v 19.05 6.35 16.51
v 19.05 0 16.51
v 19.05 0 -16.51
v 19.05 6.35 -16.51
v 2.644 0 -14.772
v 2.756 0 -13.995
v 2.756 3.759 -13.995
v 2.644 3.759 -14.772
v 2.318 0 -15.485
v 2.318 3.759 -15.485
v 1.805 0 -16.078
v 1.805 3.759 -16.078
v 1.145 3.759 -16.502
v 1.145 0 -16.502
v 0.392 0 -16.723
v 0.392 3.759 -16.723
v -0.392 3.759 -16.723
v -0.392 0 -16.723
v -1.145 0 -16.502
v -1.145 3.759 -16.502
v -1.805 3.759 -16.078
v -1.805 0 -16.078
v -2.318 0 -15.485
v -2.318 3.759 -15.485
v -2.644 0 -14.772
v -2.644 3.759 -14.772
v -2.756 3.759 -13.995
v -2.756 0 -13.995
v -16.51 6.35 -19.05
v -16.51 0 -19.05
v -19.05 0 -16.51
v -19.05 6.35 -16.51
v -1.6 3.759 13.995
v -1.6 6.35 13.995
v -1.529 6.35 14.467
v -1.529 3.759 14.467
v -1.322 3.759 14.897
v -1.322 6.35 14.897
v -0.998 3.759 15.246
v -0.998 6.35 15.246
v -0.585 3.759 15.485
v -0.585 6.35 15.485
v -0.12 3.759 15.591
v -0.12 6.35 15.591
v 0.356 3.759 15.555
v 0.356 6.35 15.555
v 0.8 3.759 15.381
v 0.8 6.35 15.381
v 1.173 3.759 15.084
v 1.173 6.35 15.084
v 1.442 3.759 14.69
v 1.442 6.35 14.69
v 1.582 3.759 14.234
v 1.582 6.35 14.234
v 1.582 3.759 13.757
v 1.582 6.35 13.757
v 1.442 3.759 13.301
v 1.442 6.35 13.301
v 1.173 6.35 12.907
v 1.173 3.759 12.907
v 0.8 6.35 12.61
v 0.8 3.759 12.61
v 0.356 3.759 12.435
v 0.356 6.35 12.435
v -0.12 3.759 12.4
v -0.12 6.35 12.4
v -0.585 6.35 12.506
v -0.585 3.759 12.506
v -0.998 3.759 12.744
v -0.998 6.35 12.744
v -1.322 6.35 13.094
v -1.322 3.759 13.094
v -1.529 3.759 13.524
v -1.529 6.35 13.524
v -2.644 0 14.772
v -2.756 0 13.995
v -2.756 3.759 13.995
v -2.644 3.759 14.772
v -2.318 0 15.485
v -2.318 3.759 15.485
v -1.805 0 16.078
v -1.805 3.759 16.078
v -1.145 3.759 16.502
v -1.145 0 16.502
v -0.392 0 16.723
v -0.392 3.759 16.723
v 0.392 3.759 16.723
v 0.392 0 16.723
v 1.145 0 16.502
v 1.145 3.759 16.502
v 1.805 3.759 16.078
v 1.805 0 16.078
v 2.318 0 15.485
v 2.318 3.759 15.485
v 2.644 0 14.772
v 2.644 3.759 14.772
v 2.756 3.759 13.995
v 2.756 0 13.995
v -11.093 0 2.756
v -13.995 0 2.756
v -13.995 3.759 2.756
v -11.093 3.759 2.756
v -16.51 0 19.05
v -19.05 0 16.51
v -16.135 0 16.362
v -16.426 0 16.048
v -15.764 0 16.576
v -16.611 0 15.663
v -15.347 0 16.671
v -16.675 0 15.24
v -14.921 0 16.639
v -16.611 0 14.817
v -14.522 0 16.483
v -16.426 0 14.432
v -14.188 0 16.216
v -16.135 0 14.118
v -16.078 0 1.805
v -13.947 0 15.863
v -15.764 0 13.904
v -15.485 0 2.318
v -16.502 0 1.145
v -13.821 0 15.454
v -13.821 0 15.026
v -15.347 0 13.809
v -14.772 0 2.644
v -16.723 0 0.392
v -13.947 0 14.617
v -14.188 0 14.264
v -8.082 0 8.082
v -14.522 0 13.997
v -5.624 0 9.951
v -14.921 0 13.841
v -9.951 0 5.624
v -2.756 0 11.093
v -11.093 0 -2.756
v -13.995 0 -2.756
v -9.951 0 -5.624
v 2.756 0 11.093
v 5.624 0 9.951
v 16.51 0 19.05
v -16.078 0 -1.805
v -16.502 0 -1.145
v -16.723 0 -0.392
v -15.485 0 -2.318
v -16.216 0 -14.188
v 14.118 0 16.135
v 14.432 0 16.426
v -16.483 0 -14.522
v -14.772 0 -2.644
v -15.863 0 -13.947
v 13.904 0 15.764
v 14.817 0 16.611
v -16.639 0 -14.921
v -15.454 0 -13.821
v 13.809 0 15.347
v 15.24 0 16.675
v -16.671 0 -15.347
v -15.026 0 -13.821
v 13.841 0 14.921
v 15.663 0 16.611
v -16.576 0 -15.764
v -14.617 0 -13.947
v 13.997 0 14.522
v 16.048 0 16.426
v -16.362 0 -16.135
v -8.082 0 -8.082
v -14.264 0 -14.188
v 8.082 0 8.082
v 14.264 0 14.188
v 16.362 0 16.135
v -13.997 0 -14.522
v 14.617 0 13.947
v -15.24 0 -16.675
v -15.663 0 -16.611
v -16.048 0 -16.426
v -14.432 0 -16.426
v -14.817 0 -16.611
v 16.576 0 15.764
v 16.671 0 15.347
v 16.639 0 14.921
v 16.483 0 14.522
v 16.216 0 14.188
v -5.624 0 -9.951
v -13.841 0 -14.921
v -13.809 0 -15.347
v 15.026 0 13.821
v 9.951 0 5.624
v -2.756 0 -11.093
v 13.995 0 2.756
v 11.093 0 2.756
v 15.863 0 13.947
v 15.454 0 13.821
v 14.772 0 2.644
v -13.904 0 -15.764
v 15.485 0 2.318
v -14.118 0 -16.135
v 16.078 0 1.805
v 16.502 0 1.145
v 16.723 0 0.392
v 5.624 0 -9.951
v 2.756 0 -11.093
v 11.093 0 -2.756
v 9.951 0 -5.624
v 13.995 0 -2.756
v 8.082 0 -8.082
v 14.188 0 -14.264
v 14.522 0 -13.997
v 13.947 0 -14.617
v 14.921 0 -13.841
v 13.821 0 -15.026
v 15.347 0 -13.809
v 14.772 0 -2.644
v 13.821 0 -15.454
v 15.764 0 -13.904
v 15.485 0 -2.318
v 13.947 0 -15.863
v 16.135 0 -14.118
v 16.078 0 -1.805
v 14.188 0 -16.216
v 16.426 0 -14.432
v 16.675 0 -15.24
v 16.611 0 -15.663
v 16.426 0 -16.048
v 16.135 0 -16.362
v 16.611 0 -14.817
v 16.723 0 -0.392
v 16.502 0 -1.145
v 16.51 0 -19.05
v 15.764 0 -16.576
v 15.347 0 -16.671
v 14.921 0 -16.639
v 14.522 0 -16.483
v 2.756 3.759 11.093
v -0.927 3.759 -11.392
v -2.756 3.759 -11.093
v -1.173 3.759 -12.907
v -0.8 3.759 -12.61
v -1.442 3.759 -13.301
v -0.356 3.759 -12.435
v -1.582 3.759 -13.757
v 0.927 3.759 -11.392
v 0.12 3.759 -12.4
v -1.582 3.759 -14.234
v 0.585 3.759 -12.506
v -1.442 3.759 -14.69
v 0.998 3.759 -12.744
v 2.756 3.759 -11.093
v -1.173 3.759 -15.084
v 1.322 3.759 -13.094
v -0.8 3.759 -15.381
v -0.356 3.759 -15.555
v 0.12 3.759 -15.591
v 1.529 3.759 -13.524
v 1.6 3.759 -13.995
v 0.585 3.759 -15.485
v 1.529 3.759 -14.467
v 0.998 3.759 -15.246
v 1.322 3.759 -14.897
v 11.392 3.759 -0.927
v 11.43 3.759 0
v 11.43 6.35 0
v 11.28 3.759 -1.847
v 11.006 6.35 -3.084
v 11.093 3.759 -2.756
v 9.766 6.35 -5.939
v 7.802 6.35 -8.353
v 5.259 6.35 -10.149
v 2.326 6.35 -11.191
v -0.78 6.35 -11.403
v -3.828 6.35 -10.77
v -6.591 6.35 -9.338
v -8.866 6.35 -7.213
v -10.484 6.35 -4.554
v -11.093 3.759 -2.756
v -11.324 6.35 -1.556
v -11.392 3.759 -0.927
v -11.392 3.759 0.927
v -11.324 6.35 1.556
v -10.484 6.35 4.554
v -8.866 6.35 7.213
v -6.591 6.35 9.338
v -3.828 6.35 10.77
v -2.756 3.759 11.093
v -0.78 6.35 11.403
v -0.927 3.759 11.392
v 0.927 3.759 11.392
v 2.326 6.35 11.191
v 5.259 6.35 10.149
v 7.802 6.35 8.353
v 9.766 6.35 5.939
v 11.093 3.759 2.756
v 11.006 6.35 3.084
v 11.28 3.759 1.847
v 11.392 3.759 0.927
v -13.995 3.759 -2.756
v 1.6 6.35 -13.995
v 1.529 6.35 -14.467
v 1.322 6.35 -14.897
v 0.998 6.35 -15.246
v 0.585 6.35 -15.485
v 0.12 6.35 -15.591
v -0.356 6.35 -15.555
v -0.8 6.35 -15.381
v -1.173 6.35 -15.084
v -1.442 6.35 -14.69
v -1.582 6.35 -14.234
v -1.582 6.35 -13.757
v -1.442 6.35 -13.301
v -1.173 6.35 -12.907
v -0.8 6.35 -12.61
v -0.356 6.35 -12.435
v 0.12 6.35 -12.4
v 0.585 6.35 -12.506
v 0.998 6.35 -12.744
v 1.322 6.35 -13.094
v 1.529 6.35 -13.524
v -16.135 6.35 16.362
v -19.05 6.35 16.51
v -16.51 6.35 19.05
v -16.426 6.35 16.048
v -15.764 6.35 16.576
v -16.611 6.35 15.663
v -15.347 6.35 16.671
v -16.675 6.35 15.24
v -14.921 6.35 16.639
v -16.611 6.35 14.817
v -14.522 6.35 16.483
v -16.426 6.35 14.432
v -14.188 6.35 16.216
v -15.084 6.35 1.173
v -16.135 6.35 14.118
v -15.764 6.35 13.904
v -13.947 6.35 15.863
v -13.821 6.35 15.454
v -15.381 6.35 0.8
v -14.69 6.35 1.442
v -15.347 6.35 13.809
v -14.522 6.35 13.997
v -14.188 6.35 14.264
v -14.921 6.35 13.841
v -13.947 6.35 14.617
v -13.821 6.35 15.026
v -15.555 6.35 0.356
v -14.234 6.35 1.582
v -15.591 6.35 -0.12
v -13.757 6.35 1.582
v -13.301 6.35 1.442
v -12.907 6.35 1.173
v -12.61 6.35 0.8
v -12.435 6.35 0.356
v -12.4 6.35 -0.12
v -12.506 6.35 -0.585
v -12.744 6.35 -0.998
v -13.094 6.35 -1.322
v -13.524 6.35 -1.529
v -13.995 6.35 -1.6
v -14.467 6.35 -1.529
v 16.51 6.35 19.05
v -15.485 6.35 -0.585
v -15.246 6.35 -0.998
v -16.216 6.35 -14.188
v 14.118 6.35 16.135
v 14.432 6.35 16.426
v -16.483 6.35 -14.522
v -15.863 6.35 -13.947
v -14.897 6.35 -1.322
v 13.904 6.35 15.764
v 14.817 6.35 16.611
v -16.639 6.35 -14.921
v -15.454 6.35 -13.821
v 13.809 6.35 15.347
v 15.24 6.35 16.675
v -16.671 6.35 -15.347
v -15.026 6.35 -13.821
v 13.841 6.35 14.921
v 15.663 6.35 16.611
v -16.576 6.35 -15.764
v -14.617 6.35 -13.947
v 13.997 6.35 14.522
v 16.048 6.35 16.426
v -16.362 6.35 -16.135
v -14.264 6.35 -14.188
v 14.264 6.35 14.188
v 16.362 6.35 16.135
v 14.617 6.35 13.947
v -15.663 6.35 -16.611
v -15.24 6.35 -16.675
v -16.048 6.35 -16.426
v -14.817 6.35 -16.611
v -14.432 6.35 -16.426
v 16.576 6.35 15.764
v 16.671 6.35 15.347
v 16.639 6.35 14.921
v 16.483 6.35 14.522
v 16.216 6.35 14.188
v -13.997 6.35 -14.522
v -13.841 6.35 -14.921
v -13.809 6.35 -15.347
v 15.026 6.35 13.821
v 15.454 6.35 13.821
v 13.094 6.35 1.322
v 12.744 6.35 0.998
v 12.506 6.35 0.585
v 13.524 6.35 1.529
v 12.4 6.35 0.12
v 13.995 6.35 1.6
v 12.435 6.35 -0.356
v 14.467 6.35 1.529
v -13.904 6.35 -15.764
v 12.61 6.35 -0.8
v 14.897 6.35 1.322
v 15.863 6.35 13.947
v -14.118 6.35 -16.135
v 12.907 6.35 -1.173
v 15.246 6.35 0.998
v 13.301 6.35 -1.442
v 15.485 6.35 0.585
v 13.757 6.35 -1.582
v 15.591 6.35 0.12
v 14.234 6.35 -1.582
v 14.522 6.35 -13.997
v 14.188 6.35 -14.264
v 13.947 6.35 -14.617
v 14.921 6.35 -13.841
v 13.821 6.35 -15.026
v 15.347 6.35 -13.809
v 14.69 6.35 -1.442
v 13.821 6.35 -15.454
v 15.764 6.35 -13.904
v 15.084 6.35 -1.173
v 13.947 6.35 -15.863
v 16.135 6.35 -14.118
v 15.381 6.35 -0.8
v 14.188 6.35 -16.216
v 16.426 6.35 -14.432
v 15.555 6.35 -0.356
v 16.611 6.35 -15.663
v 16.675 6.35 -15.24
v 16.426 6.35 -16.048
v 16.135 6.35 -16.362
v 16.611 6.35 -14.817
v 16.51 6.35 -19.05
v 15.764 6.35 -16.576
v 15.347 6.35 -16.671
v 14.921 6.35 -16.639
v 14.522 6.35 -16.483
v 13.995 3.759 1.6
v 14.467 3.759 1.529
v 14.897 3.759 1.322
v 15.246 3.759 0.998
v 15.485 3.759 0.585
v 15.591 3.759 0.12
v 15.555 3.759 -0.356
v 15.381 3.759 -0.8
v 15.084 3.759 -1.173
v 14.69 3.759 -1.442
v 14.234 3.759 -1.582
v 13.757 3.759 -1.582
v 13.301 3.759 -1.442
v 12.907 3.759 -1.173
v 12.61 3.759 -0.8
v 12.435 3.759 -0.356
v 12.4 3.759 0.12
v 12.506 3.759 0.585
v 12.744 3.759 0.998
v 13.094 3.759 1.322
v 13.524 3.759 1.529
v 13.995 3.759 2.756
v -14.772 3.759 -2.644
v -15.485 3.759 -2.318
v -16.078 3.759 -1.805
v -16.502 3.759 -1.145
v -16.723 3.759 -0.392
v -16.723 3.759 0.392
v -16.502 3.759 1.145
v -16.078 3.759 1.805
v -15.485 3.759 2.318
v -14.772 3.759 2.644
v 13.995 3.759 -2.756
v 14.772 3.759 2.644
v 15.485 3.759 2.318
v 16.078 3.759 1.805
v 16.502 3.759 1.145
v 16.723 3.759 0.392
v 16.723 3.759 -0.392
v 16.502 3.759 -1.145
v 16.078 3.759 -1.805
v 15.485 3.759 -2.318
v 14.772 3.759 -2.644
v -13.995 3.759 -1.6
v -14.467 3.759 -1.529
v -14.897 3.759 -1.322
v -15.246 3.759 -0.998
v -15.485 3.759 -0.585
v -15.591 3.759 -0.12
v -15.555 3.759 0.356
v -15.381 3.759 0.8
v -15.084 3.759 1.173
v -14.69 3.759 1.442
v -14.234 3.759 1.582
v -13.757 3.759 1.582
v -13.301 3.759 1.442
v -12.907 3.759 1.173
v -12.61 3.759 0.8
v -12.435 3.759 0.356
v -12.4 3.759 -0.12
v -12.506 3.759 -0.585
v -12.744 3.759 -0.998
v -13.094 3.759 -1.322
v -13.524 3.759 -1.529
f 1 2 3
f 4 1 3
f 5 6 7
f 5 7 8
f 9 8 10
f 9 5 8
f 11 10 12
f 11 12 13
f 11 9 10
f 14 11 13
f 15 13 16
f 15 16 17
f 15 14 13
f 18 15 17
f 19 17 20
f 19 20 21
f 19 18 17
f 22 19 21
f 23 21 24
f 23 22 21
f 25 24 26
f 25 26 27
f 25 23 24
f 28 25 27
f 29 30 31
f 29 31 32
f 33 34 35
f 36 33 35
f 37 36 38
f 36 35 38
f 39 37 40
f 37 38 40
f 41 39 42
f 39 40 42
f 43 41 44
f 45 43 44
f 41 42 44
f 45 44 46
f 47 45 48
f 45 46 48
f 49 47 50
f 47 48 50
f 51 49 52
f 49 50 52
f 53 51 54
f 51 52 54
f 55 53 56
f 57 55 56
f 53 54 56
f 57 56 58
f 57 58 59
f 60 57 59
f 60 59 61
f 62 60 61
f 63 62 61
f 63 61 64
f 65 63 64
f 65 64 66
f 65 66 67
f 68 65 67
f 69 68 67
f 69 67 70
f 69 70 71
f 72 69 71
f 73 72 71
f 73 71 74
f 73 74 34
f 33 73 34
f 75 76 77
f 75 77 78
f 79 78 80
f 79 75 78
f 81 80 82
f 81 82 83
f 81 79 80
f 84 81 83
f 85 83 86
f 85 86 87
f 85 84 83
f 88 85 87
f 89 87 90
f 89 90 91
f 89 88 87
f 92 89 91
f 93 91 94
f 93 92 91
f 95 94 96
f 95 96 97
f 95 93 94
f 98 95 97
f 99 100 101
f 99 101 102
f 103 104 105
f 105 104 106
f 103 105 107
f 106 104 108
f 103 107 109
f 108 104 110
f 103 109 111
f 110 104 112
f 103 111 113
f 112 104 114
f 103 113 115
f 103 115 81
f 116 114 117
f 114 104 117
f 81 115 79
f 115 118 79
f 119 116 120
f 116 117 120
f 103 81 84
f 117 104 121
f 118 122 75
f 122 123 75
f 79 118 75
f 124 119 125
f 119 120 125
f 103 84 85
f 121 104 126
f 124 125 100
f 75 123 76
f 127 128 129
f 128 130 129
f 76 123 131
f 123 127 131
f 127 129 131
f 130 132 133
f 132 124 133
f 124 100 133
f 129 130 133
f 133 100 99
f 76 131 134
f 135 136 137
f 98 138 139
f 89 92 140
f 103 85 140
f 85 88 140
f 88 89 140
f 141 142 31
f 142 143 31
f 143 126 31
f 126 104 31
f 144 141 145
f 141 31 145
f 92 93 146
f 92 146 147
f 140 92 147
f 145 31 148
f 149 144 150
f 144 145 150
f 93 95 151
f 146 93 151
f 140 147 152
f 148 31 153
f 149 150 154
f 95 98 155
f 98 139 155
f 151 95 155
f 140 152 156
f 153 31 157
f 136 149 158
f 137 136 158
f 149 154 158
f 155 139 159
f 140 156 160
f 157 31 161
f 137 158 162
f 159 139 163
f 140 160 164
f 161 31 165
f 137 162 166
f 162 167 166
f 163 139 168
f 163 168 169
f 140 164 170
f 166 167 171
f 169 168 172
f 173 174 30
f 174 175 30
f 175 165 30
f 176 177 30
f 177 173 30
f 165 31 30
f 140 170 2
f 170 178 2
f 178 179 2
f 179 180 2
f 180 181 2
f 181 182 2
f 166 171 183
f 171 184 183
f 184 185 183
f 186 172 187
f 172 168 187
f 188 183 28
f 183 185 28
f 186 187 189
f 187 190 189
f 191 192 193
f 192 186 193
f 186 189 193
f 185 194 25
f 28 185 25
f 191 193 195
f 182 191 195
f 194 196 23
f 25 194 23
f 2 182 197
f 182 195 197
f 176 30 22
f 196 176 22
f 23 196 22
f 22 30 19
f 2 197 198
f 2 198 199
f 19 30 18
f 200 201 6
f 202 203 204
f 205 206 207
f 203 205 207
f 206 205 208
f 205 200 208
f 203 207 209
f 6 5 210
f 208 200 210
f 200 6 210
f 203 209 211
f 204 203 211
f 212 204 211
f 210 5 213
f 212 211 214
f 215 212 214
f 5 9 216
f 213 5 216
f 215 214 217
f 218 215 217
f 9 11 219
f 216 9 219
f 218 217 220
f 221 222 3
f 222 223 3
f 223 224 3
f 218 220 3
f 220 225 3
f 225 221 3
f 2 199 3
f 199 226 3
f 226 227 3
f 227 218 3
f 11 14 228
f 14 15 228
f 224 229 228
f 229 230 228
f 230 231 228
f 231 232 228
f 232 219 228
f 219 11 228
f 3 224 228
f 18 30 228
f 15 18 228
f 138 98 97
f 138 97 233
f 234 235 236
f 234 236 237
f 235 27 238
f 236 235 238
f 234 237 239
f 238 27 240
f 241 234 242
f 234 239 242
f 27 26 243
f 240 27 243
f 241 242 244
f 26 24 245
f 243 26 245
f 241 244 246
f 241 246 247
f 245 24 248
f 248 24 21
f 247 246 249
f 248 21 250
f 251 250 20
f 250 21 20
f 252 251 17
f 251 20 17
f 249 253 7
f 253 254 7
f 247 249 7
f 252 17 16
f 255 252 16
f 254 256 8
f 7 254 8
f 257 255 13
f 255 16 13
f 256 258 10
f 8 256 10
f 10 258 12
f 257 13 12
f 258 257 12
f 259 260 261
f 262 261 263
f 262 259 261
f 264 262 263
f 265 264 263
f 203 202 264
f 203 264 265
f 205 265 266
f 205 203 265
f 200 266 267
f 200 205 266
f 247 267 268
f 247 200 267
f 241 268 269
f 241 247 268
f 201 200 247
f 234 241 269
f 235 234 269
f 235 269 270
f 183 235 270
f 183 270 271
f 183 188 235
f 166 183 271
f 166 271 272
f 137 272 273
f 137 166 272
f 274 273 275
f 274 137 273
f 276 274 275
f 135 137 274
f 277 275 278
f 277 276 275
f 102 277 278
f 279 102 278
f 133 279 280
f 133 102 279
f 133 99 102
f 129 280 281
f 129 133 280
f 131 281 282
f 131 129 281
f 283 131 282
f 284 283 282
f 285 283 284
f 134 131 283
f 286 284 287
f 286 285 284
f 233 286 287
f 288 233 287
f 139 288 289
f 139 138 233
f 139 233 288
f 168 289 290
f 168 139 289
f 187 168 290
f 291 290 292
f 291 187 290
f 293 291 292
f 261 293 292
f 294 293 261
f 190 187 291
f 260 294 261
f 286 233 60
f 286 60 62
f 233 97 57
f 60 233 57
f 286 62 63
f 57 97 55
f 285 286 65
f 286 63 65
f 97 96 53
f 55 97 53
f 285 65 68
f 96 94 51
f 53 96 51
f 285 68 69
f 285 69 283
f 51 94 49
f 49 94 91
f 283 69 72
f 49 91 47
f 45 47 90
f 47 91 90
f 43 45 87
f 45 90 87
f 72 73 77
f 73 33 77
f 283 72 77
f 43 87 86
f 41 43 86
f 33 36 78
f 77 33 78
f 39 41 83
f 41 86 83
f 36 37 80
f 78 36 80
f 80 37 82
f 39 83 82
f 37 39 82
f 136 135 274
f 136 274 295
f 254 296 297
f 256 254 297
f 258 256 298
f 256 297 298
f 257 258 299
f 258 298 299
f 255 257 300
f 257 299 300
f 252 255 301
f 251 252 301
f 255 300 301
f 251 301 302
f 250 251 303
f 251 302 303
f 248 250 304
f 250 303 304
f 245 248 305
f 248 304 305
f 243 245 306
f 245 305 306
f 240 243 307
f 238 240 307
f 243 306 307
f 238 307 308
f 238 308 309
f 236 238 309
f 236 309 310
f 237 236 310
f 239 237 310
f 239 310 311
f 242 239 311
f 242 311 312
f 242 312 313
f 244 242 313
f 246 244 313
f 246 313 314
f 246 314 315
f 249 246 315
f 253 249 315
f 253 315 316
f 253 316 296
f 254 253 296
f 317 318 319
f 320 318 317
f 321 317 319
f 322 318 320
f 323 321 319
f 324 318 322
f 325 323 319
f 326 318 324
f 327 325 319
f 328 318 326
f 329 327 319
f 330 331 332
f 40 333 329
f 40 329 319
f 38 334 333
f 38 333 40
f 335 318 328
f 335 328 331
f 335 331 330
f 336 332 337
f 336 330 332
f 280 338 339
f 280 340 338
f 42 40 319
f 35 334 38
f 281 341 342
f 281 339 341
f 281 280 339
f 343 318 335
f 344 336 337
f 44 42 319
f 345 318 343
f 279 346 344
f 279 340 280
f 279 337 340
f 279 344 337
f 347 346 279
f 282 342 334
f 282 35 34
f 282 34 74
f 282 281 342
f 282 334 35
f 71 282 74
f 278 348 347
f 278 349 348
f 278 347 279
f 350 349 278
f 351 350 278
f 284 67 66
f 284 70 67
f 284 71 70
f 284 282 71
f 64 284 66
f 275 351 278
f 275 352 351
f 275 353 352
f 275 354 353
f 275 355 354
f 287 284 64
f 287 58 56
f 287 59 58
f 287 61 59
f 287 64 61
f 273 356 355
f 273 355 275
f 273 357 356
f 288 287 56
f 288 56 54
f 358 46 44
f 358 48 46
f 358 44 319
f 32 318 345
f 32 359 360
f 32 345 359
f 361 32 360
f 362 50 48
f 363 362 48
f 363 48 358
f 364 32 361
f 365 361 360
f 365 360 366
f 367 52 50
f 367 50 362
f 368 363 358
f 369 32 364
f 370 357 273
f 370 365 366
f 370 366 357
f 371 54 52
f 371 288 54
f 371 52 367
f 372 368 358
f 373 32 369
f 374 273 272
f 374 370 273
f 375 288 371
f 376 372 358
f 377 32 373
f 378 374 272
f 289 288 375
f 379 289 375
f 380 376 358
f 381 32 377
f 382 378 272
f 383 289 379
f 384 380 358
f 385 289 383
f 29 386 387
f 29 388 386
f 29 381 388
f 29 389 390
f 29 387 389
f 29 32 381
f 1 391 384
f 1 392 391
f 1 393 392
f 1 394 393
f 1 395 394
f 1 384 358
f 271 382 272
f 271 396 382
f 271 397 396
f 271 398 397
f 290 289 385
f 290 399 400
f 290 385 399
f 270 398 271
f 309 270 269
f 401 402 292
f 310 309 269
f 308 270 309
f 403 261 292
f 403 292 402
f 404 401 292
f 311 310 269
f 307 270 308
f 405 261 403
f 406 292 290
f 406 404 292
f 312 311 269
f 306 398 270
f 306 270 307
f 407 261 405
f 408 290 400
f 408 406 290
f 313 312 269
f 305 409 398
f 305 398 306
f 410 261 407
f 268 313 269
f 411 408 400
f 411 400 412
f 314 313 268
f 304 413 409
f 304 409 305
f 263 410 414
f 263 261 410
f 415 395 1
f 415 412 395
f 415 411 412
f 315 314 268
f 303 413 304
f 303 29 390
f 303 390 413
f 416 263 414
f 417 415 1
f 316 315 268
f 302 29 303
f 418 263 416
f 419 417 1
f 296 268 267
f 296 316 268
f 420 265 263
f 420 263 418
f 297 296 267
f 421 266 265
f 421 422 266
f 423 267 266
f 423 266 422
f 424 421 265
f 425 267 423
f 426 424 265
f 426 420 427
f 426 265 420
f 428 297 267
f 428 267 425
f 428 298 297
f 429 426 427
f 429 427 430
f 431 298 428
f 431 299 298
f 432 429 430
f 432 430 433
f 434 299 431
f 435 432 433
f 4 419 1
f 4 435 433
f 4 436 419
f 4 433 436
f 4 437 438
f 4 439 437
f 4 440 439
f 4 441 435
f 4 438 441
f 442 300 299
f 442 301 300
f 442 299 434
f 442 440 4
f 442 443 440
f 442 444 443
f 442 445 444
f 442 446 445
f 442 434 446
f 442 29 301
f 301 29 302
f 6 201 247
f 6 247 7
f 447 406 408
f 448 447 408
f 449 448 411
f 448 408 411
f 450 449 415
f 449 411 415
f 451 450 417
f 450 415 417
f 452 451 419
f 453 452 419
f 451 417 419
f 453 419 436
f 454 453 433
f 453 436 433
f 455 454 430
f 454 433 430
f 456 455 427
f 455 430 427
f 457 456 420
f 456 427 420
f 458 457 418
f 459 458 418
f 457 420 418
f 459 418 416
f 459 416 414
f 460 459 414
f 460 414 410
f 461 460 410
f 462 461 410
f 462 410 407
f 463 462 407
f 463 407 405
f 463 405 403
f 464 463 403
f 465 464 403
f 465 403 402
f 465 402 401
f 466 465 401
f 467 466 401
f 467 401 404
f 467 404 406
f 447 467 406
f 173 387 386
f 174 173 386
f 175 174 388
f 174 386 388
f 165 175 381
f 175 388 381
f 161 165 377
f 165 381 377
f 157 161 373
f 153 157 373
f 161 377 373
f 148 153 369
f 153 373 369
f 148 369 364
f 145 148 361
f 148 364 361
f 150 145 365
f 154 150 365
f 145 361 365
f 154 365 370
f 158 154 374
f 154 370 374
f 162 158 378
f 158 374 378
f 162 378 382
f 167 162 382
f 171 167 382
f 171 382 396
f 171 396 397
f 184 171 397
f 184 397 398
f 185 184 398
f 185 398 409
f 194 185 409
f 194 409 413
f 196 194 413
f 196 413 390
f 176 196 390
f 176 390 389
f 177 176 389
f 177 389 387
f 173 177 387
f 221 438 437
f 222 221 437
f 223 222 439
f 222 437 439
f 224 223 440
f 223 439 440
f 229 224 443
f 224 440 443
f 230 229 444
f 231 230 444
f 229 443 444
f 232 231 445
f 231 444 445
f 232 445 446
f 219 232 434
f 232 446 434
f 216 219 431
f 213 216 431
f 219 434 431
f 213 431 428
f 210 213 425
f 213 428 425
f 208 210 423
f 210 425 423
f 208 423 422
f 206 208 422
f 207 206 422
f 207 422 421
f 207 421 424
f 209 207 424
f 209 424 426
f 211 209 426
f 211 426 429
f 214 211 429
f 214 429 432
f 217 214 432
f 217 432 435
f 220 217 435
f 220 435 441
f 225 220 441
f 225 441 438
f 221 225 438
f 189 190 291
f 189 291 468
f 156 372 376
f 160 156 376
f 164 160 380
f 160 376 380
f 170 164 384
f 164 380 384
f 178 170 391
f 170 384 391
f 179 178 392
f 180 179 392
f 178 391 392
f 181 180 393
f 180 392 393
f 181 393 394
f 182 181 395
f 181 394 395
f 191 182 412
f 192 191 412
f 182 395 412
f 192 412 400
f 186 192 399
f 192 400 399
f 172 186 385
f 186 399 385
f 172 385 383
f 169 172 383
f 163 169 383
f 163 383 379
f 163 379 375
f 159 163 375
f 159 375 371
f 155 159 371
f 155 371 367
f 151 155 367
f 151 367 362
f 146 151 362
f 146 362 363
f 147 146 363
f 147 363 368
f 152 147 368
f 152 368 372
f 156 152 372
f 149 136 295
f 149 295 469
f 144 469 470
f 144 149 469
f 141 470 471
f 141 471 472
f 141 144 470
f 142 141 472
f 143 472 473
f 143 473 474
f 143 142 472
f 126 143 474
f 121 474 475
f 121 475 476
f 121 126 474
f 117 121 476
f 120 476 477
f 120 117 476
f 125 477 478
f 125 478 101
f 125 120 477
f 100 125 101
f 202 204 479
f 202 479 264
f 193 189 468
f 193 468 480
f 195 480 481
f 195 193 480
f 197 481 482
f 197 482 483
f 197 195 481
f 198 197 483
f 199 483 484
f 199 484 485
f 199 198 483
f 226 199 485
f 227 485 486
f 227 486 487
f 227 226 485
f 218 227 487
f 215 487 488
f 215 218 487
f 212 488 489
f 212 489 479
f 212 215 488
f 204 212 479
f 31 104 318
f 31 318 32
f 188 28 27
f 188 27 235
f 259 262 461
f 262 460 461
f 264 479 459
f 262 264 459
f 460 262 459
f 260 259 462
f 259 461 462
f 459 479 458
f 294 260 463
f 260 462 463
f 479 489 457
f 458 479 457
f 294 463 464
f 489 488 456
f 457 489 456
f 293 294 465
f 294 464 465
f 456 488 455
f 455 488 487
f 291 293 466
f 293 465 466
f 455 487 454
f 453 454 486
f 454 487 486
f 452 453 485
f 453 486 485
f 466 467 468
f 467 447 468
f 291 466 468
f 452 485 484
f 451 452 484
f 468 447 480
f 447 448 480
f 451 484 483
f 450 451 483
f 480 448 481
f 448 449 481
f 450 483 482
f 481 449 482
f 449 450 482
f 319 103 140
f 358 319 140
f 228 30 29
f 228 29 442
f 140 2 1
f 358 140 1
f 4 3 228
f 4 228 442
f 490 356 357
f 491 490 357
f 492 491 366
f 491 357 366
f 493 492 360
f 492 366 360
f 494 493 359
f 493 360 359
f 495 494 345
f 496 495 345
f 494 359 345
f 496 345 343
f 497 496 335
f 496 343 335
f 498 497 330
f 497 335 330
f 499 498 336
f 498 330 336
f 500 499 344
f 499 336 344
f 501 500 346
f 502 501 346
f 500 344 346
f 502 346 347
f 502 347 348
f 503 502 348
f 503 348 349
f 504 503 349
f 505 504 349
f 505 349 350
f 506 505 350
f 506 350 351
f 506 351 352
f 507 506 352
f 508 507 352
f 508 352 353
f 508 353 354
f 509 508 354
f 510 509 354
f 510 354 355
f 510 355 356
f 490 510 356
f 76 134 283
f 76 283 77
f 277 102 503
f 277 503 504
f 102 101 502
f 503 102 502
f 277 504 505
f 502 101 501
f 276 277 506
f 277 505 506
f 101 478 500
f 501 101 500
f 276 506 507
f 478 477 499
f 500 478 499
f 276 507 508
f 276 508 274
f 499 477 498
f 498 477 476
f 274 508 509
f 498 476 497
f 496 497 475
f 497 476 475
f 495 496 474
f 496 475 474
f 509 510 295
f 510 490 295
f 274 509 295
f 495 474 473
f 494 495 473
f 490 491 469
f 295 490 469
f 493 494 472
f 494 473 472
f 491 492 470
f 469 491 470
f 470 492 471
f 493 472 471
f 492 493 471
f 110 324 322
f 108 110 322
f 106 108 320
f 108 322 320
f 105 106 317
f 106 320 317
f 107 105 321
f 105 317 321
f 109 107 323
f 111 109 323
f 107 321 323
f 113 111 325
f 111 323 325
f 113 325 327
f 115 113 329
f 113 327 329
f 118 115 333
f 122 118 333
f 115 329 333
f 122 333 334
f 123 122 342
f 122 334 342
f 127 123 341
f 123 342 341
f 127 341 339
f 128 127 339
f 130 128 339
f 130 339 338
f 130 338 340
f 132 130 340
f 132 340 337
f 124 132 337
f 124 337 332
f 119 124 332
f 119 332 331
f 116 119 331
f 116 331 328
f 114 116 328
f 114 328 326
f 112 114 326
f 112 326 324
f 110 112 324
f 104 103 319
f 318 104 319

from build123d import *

# Parameters (mm, degrees)
SKETCH1_W           = 38.1
SKETCH1_H           = 38.1
SKETCH1_R           = 11.43
BOSS_EXTRUDE1_DEPTH = 6.35
SKETCH2_R           = 1.6002
SKETCH2_R_2         = 1.4351
CUT_EXTRUDE1_DEPTH  = 7.35
CIRPATTERN1_COUNT   = 4
CHAMFER1_SIZE       = 2.54
CUT_EXTRUDE2_DEPTH  = 3.7592
CIRPATTERN4_COUNT   = 4


with BuildPart() as part:
    # Sketch1 → Boss-Extrude1 (new body)
    with BuildSketch(Plane(origin=(0, 0, 0), x_dir=(1, 0, 0), z_dir=(0, 1, 0))):
        Rectangle(SKETCH1_W, SKETCH1_H)
        Circle(SKETCH1_R, mode=Mode.SUBTRACT)
    extrude(amount=BOSS_EXTRUDE1_DEPTH)

    # Sketch2 → Cut-Extrude1 (cut, through all)
    with BuildSketch(Plane(origin=(0, 6.35, 0), x_dir=(1, 0, 0), z_dir=(0, 1, 0))):
        with Locations((0, 13.9954)):
            Circle(SKETCH2_R)
        with Locations((15.24, 15.24)):
            Circle(SKETCH2_R_2)
    cut_extrude1 = extrude(amount=-CUT_EXTRUDE1_DEPTH, mode=Mode.SUBTRACT)

    # CirPattern1: Cut-Extrude1 ×4 about axis
    cirpattern1_axis = Axis((0, 0, 0), (0, 1, 0))
    for i in range(1, CIRPATTERN1_COUNT):
        add(cut_extrude1.rotate(cirpattern1_axis, i * 360 / CIRPATTERN1_COUNT), mode=Mode.SUBTRACT)

    # Chamfer1
    chamfer1_edges = [part.edges().sort_by_distance(p)[0] for p in [
        (19.05, 3.175, 19.05),
        (-19.05, 3.175, 19.05),
        (-19.05, 3.175, -19.05),
        (19.05, 3.175, -19.05),
    ]]
    chamfer(chamfer1_edges, length=CHAMFER1_SIZE)

    # Sketch3 → Cut-Extrude2 (cut)
    with BuildSketch(Plane.XZ):
        with BuildLine():
            Line((2.7559, 13.9954), (2.7559, 0))
            ThreePointArc((2.7559, 0), (0, -2.7559), (-2.7559, 0))
            Line((-2.7559, 0), (-2.7559, 13.9954))
            ThreePointArc((-2.7559, 13.9954), (0, 16.7513), (2.7559, 13.9954))
        make_face()
    cut_extrude2 = extrude(amount=-CUT_EXTRUDE2_DEPTH, mode=Mode.SUBTRACT)

    # CirPattern4: Cut-Extrude2 ×4 about axis
    cirpattern4_axis = Axis((0, 0, 0), (0, 1, 0))
    for i in range(1, CIRPATTERN4_COUNT):
        add(cut_extrude2.rotate(cirpattern4_axis, i * 360 / CIRPATTERN4_COUNT), mode=Mode.SUBTRACT)


solid = part.part
